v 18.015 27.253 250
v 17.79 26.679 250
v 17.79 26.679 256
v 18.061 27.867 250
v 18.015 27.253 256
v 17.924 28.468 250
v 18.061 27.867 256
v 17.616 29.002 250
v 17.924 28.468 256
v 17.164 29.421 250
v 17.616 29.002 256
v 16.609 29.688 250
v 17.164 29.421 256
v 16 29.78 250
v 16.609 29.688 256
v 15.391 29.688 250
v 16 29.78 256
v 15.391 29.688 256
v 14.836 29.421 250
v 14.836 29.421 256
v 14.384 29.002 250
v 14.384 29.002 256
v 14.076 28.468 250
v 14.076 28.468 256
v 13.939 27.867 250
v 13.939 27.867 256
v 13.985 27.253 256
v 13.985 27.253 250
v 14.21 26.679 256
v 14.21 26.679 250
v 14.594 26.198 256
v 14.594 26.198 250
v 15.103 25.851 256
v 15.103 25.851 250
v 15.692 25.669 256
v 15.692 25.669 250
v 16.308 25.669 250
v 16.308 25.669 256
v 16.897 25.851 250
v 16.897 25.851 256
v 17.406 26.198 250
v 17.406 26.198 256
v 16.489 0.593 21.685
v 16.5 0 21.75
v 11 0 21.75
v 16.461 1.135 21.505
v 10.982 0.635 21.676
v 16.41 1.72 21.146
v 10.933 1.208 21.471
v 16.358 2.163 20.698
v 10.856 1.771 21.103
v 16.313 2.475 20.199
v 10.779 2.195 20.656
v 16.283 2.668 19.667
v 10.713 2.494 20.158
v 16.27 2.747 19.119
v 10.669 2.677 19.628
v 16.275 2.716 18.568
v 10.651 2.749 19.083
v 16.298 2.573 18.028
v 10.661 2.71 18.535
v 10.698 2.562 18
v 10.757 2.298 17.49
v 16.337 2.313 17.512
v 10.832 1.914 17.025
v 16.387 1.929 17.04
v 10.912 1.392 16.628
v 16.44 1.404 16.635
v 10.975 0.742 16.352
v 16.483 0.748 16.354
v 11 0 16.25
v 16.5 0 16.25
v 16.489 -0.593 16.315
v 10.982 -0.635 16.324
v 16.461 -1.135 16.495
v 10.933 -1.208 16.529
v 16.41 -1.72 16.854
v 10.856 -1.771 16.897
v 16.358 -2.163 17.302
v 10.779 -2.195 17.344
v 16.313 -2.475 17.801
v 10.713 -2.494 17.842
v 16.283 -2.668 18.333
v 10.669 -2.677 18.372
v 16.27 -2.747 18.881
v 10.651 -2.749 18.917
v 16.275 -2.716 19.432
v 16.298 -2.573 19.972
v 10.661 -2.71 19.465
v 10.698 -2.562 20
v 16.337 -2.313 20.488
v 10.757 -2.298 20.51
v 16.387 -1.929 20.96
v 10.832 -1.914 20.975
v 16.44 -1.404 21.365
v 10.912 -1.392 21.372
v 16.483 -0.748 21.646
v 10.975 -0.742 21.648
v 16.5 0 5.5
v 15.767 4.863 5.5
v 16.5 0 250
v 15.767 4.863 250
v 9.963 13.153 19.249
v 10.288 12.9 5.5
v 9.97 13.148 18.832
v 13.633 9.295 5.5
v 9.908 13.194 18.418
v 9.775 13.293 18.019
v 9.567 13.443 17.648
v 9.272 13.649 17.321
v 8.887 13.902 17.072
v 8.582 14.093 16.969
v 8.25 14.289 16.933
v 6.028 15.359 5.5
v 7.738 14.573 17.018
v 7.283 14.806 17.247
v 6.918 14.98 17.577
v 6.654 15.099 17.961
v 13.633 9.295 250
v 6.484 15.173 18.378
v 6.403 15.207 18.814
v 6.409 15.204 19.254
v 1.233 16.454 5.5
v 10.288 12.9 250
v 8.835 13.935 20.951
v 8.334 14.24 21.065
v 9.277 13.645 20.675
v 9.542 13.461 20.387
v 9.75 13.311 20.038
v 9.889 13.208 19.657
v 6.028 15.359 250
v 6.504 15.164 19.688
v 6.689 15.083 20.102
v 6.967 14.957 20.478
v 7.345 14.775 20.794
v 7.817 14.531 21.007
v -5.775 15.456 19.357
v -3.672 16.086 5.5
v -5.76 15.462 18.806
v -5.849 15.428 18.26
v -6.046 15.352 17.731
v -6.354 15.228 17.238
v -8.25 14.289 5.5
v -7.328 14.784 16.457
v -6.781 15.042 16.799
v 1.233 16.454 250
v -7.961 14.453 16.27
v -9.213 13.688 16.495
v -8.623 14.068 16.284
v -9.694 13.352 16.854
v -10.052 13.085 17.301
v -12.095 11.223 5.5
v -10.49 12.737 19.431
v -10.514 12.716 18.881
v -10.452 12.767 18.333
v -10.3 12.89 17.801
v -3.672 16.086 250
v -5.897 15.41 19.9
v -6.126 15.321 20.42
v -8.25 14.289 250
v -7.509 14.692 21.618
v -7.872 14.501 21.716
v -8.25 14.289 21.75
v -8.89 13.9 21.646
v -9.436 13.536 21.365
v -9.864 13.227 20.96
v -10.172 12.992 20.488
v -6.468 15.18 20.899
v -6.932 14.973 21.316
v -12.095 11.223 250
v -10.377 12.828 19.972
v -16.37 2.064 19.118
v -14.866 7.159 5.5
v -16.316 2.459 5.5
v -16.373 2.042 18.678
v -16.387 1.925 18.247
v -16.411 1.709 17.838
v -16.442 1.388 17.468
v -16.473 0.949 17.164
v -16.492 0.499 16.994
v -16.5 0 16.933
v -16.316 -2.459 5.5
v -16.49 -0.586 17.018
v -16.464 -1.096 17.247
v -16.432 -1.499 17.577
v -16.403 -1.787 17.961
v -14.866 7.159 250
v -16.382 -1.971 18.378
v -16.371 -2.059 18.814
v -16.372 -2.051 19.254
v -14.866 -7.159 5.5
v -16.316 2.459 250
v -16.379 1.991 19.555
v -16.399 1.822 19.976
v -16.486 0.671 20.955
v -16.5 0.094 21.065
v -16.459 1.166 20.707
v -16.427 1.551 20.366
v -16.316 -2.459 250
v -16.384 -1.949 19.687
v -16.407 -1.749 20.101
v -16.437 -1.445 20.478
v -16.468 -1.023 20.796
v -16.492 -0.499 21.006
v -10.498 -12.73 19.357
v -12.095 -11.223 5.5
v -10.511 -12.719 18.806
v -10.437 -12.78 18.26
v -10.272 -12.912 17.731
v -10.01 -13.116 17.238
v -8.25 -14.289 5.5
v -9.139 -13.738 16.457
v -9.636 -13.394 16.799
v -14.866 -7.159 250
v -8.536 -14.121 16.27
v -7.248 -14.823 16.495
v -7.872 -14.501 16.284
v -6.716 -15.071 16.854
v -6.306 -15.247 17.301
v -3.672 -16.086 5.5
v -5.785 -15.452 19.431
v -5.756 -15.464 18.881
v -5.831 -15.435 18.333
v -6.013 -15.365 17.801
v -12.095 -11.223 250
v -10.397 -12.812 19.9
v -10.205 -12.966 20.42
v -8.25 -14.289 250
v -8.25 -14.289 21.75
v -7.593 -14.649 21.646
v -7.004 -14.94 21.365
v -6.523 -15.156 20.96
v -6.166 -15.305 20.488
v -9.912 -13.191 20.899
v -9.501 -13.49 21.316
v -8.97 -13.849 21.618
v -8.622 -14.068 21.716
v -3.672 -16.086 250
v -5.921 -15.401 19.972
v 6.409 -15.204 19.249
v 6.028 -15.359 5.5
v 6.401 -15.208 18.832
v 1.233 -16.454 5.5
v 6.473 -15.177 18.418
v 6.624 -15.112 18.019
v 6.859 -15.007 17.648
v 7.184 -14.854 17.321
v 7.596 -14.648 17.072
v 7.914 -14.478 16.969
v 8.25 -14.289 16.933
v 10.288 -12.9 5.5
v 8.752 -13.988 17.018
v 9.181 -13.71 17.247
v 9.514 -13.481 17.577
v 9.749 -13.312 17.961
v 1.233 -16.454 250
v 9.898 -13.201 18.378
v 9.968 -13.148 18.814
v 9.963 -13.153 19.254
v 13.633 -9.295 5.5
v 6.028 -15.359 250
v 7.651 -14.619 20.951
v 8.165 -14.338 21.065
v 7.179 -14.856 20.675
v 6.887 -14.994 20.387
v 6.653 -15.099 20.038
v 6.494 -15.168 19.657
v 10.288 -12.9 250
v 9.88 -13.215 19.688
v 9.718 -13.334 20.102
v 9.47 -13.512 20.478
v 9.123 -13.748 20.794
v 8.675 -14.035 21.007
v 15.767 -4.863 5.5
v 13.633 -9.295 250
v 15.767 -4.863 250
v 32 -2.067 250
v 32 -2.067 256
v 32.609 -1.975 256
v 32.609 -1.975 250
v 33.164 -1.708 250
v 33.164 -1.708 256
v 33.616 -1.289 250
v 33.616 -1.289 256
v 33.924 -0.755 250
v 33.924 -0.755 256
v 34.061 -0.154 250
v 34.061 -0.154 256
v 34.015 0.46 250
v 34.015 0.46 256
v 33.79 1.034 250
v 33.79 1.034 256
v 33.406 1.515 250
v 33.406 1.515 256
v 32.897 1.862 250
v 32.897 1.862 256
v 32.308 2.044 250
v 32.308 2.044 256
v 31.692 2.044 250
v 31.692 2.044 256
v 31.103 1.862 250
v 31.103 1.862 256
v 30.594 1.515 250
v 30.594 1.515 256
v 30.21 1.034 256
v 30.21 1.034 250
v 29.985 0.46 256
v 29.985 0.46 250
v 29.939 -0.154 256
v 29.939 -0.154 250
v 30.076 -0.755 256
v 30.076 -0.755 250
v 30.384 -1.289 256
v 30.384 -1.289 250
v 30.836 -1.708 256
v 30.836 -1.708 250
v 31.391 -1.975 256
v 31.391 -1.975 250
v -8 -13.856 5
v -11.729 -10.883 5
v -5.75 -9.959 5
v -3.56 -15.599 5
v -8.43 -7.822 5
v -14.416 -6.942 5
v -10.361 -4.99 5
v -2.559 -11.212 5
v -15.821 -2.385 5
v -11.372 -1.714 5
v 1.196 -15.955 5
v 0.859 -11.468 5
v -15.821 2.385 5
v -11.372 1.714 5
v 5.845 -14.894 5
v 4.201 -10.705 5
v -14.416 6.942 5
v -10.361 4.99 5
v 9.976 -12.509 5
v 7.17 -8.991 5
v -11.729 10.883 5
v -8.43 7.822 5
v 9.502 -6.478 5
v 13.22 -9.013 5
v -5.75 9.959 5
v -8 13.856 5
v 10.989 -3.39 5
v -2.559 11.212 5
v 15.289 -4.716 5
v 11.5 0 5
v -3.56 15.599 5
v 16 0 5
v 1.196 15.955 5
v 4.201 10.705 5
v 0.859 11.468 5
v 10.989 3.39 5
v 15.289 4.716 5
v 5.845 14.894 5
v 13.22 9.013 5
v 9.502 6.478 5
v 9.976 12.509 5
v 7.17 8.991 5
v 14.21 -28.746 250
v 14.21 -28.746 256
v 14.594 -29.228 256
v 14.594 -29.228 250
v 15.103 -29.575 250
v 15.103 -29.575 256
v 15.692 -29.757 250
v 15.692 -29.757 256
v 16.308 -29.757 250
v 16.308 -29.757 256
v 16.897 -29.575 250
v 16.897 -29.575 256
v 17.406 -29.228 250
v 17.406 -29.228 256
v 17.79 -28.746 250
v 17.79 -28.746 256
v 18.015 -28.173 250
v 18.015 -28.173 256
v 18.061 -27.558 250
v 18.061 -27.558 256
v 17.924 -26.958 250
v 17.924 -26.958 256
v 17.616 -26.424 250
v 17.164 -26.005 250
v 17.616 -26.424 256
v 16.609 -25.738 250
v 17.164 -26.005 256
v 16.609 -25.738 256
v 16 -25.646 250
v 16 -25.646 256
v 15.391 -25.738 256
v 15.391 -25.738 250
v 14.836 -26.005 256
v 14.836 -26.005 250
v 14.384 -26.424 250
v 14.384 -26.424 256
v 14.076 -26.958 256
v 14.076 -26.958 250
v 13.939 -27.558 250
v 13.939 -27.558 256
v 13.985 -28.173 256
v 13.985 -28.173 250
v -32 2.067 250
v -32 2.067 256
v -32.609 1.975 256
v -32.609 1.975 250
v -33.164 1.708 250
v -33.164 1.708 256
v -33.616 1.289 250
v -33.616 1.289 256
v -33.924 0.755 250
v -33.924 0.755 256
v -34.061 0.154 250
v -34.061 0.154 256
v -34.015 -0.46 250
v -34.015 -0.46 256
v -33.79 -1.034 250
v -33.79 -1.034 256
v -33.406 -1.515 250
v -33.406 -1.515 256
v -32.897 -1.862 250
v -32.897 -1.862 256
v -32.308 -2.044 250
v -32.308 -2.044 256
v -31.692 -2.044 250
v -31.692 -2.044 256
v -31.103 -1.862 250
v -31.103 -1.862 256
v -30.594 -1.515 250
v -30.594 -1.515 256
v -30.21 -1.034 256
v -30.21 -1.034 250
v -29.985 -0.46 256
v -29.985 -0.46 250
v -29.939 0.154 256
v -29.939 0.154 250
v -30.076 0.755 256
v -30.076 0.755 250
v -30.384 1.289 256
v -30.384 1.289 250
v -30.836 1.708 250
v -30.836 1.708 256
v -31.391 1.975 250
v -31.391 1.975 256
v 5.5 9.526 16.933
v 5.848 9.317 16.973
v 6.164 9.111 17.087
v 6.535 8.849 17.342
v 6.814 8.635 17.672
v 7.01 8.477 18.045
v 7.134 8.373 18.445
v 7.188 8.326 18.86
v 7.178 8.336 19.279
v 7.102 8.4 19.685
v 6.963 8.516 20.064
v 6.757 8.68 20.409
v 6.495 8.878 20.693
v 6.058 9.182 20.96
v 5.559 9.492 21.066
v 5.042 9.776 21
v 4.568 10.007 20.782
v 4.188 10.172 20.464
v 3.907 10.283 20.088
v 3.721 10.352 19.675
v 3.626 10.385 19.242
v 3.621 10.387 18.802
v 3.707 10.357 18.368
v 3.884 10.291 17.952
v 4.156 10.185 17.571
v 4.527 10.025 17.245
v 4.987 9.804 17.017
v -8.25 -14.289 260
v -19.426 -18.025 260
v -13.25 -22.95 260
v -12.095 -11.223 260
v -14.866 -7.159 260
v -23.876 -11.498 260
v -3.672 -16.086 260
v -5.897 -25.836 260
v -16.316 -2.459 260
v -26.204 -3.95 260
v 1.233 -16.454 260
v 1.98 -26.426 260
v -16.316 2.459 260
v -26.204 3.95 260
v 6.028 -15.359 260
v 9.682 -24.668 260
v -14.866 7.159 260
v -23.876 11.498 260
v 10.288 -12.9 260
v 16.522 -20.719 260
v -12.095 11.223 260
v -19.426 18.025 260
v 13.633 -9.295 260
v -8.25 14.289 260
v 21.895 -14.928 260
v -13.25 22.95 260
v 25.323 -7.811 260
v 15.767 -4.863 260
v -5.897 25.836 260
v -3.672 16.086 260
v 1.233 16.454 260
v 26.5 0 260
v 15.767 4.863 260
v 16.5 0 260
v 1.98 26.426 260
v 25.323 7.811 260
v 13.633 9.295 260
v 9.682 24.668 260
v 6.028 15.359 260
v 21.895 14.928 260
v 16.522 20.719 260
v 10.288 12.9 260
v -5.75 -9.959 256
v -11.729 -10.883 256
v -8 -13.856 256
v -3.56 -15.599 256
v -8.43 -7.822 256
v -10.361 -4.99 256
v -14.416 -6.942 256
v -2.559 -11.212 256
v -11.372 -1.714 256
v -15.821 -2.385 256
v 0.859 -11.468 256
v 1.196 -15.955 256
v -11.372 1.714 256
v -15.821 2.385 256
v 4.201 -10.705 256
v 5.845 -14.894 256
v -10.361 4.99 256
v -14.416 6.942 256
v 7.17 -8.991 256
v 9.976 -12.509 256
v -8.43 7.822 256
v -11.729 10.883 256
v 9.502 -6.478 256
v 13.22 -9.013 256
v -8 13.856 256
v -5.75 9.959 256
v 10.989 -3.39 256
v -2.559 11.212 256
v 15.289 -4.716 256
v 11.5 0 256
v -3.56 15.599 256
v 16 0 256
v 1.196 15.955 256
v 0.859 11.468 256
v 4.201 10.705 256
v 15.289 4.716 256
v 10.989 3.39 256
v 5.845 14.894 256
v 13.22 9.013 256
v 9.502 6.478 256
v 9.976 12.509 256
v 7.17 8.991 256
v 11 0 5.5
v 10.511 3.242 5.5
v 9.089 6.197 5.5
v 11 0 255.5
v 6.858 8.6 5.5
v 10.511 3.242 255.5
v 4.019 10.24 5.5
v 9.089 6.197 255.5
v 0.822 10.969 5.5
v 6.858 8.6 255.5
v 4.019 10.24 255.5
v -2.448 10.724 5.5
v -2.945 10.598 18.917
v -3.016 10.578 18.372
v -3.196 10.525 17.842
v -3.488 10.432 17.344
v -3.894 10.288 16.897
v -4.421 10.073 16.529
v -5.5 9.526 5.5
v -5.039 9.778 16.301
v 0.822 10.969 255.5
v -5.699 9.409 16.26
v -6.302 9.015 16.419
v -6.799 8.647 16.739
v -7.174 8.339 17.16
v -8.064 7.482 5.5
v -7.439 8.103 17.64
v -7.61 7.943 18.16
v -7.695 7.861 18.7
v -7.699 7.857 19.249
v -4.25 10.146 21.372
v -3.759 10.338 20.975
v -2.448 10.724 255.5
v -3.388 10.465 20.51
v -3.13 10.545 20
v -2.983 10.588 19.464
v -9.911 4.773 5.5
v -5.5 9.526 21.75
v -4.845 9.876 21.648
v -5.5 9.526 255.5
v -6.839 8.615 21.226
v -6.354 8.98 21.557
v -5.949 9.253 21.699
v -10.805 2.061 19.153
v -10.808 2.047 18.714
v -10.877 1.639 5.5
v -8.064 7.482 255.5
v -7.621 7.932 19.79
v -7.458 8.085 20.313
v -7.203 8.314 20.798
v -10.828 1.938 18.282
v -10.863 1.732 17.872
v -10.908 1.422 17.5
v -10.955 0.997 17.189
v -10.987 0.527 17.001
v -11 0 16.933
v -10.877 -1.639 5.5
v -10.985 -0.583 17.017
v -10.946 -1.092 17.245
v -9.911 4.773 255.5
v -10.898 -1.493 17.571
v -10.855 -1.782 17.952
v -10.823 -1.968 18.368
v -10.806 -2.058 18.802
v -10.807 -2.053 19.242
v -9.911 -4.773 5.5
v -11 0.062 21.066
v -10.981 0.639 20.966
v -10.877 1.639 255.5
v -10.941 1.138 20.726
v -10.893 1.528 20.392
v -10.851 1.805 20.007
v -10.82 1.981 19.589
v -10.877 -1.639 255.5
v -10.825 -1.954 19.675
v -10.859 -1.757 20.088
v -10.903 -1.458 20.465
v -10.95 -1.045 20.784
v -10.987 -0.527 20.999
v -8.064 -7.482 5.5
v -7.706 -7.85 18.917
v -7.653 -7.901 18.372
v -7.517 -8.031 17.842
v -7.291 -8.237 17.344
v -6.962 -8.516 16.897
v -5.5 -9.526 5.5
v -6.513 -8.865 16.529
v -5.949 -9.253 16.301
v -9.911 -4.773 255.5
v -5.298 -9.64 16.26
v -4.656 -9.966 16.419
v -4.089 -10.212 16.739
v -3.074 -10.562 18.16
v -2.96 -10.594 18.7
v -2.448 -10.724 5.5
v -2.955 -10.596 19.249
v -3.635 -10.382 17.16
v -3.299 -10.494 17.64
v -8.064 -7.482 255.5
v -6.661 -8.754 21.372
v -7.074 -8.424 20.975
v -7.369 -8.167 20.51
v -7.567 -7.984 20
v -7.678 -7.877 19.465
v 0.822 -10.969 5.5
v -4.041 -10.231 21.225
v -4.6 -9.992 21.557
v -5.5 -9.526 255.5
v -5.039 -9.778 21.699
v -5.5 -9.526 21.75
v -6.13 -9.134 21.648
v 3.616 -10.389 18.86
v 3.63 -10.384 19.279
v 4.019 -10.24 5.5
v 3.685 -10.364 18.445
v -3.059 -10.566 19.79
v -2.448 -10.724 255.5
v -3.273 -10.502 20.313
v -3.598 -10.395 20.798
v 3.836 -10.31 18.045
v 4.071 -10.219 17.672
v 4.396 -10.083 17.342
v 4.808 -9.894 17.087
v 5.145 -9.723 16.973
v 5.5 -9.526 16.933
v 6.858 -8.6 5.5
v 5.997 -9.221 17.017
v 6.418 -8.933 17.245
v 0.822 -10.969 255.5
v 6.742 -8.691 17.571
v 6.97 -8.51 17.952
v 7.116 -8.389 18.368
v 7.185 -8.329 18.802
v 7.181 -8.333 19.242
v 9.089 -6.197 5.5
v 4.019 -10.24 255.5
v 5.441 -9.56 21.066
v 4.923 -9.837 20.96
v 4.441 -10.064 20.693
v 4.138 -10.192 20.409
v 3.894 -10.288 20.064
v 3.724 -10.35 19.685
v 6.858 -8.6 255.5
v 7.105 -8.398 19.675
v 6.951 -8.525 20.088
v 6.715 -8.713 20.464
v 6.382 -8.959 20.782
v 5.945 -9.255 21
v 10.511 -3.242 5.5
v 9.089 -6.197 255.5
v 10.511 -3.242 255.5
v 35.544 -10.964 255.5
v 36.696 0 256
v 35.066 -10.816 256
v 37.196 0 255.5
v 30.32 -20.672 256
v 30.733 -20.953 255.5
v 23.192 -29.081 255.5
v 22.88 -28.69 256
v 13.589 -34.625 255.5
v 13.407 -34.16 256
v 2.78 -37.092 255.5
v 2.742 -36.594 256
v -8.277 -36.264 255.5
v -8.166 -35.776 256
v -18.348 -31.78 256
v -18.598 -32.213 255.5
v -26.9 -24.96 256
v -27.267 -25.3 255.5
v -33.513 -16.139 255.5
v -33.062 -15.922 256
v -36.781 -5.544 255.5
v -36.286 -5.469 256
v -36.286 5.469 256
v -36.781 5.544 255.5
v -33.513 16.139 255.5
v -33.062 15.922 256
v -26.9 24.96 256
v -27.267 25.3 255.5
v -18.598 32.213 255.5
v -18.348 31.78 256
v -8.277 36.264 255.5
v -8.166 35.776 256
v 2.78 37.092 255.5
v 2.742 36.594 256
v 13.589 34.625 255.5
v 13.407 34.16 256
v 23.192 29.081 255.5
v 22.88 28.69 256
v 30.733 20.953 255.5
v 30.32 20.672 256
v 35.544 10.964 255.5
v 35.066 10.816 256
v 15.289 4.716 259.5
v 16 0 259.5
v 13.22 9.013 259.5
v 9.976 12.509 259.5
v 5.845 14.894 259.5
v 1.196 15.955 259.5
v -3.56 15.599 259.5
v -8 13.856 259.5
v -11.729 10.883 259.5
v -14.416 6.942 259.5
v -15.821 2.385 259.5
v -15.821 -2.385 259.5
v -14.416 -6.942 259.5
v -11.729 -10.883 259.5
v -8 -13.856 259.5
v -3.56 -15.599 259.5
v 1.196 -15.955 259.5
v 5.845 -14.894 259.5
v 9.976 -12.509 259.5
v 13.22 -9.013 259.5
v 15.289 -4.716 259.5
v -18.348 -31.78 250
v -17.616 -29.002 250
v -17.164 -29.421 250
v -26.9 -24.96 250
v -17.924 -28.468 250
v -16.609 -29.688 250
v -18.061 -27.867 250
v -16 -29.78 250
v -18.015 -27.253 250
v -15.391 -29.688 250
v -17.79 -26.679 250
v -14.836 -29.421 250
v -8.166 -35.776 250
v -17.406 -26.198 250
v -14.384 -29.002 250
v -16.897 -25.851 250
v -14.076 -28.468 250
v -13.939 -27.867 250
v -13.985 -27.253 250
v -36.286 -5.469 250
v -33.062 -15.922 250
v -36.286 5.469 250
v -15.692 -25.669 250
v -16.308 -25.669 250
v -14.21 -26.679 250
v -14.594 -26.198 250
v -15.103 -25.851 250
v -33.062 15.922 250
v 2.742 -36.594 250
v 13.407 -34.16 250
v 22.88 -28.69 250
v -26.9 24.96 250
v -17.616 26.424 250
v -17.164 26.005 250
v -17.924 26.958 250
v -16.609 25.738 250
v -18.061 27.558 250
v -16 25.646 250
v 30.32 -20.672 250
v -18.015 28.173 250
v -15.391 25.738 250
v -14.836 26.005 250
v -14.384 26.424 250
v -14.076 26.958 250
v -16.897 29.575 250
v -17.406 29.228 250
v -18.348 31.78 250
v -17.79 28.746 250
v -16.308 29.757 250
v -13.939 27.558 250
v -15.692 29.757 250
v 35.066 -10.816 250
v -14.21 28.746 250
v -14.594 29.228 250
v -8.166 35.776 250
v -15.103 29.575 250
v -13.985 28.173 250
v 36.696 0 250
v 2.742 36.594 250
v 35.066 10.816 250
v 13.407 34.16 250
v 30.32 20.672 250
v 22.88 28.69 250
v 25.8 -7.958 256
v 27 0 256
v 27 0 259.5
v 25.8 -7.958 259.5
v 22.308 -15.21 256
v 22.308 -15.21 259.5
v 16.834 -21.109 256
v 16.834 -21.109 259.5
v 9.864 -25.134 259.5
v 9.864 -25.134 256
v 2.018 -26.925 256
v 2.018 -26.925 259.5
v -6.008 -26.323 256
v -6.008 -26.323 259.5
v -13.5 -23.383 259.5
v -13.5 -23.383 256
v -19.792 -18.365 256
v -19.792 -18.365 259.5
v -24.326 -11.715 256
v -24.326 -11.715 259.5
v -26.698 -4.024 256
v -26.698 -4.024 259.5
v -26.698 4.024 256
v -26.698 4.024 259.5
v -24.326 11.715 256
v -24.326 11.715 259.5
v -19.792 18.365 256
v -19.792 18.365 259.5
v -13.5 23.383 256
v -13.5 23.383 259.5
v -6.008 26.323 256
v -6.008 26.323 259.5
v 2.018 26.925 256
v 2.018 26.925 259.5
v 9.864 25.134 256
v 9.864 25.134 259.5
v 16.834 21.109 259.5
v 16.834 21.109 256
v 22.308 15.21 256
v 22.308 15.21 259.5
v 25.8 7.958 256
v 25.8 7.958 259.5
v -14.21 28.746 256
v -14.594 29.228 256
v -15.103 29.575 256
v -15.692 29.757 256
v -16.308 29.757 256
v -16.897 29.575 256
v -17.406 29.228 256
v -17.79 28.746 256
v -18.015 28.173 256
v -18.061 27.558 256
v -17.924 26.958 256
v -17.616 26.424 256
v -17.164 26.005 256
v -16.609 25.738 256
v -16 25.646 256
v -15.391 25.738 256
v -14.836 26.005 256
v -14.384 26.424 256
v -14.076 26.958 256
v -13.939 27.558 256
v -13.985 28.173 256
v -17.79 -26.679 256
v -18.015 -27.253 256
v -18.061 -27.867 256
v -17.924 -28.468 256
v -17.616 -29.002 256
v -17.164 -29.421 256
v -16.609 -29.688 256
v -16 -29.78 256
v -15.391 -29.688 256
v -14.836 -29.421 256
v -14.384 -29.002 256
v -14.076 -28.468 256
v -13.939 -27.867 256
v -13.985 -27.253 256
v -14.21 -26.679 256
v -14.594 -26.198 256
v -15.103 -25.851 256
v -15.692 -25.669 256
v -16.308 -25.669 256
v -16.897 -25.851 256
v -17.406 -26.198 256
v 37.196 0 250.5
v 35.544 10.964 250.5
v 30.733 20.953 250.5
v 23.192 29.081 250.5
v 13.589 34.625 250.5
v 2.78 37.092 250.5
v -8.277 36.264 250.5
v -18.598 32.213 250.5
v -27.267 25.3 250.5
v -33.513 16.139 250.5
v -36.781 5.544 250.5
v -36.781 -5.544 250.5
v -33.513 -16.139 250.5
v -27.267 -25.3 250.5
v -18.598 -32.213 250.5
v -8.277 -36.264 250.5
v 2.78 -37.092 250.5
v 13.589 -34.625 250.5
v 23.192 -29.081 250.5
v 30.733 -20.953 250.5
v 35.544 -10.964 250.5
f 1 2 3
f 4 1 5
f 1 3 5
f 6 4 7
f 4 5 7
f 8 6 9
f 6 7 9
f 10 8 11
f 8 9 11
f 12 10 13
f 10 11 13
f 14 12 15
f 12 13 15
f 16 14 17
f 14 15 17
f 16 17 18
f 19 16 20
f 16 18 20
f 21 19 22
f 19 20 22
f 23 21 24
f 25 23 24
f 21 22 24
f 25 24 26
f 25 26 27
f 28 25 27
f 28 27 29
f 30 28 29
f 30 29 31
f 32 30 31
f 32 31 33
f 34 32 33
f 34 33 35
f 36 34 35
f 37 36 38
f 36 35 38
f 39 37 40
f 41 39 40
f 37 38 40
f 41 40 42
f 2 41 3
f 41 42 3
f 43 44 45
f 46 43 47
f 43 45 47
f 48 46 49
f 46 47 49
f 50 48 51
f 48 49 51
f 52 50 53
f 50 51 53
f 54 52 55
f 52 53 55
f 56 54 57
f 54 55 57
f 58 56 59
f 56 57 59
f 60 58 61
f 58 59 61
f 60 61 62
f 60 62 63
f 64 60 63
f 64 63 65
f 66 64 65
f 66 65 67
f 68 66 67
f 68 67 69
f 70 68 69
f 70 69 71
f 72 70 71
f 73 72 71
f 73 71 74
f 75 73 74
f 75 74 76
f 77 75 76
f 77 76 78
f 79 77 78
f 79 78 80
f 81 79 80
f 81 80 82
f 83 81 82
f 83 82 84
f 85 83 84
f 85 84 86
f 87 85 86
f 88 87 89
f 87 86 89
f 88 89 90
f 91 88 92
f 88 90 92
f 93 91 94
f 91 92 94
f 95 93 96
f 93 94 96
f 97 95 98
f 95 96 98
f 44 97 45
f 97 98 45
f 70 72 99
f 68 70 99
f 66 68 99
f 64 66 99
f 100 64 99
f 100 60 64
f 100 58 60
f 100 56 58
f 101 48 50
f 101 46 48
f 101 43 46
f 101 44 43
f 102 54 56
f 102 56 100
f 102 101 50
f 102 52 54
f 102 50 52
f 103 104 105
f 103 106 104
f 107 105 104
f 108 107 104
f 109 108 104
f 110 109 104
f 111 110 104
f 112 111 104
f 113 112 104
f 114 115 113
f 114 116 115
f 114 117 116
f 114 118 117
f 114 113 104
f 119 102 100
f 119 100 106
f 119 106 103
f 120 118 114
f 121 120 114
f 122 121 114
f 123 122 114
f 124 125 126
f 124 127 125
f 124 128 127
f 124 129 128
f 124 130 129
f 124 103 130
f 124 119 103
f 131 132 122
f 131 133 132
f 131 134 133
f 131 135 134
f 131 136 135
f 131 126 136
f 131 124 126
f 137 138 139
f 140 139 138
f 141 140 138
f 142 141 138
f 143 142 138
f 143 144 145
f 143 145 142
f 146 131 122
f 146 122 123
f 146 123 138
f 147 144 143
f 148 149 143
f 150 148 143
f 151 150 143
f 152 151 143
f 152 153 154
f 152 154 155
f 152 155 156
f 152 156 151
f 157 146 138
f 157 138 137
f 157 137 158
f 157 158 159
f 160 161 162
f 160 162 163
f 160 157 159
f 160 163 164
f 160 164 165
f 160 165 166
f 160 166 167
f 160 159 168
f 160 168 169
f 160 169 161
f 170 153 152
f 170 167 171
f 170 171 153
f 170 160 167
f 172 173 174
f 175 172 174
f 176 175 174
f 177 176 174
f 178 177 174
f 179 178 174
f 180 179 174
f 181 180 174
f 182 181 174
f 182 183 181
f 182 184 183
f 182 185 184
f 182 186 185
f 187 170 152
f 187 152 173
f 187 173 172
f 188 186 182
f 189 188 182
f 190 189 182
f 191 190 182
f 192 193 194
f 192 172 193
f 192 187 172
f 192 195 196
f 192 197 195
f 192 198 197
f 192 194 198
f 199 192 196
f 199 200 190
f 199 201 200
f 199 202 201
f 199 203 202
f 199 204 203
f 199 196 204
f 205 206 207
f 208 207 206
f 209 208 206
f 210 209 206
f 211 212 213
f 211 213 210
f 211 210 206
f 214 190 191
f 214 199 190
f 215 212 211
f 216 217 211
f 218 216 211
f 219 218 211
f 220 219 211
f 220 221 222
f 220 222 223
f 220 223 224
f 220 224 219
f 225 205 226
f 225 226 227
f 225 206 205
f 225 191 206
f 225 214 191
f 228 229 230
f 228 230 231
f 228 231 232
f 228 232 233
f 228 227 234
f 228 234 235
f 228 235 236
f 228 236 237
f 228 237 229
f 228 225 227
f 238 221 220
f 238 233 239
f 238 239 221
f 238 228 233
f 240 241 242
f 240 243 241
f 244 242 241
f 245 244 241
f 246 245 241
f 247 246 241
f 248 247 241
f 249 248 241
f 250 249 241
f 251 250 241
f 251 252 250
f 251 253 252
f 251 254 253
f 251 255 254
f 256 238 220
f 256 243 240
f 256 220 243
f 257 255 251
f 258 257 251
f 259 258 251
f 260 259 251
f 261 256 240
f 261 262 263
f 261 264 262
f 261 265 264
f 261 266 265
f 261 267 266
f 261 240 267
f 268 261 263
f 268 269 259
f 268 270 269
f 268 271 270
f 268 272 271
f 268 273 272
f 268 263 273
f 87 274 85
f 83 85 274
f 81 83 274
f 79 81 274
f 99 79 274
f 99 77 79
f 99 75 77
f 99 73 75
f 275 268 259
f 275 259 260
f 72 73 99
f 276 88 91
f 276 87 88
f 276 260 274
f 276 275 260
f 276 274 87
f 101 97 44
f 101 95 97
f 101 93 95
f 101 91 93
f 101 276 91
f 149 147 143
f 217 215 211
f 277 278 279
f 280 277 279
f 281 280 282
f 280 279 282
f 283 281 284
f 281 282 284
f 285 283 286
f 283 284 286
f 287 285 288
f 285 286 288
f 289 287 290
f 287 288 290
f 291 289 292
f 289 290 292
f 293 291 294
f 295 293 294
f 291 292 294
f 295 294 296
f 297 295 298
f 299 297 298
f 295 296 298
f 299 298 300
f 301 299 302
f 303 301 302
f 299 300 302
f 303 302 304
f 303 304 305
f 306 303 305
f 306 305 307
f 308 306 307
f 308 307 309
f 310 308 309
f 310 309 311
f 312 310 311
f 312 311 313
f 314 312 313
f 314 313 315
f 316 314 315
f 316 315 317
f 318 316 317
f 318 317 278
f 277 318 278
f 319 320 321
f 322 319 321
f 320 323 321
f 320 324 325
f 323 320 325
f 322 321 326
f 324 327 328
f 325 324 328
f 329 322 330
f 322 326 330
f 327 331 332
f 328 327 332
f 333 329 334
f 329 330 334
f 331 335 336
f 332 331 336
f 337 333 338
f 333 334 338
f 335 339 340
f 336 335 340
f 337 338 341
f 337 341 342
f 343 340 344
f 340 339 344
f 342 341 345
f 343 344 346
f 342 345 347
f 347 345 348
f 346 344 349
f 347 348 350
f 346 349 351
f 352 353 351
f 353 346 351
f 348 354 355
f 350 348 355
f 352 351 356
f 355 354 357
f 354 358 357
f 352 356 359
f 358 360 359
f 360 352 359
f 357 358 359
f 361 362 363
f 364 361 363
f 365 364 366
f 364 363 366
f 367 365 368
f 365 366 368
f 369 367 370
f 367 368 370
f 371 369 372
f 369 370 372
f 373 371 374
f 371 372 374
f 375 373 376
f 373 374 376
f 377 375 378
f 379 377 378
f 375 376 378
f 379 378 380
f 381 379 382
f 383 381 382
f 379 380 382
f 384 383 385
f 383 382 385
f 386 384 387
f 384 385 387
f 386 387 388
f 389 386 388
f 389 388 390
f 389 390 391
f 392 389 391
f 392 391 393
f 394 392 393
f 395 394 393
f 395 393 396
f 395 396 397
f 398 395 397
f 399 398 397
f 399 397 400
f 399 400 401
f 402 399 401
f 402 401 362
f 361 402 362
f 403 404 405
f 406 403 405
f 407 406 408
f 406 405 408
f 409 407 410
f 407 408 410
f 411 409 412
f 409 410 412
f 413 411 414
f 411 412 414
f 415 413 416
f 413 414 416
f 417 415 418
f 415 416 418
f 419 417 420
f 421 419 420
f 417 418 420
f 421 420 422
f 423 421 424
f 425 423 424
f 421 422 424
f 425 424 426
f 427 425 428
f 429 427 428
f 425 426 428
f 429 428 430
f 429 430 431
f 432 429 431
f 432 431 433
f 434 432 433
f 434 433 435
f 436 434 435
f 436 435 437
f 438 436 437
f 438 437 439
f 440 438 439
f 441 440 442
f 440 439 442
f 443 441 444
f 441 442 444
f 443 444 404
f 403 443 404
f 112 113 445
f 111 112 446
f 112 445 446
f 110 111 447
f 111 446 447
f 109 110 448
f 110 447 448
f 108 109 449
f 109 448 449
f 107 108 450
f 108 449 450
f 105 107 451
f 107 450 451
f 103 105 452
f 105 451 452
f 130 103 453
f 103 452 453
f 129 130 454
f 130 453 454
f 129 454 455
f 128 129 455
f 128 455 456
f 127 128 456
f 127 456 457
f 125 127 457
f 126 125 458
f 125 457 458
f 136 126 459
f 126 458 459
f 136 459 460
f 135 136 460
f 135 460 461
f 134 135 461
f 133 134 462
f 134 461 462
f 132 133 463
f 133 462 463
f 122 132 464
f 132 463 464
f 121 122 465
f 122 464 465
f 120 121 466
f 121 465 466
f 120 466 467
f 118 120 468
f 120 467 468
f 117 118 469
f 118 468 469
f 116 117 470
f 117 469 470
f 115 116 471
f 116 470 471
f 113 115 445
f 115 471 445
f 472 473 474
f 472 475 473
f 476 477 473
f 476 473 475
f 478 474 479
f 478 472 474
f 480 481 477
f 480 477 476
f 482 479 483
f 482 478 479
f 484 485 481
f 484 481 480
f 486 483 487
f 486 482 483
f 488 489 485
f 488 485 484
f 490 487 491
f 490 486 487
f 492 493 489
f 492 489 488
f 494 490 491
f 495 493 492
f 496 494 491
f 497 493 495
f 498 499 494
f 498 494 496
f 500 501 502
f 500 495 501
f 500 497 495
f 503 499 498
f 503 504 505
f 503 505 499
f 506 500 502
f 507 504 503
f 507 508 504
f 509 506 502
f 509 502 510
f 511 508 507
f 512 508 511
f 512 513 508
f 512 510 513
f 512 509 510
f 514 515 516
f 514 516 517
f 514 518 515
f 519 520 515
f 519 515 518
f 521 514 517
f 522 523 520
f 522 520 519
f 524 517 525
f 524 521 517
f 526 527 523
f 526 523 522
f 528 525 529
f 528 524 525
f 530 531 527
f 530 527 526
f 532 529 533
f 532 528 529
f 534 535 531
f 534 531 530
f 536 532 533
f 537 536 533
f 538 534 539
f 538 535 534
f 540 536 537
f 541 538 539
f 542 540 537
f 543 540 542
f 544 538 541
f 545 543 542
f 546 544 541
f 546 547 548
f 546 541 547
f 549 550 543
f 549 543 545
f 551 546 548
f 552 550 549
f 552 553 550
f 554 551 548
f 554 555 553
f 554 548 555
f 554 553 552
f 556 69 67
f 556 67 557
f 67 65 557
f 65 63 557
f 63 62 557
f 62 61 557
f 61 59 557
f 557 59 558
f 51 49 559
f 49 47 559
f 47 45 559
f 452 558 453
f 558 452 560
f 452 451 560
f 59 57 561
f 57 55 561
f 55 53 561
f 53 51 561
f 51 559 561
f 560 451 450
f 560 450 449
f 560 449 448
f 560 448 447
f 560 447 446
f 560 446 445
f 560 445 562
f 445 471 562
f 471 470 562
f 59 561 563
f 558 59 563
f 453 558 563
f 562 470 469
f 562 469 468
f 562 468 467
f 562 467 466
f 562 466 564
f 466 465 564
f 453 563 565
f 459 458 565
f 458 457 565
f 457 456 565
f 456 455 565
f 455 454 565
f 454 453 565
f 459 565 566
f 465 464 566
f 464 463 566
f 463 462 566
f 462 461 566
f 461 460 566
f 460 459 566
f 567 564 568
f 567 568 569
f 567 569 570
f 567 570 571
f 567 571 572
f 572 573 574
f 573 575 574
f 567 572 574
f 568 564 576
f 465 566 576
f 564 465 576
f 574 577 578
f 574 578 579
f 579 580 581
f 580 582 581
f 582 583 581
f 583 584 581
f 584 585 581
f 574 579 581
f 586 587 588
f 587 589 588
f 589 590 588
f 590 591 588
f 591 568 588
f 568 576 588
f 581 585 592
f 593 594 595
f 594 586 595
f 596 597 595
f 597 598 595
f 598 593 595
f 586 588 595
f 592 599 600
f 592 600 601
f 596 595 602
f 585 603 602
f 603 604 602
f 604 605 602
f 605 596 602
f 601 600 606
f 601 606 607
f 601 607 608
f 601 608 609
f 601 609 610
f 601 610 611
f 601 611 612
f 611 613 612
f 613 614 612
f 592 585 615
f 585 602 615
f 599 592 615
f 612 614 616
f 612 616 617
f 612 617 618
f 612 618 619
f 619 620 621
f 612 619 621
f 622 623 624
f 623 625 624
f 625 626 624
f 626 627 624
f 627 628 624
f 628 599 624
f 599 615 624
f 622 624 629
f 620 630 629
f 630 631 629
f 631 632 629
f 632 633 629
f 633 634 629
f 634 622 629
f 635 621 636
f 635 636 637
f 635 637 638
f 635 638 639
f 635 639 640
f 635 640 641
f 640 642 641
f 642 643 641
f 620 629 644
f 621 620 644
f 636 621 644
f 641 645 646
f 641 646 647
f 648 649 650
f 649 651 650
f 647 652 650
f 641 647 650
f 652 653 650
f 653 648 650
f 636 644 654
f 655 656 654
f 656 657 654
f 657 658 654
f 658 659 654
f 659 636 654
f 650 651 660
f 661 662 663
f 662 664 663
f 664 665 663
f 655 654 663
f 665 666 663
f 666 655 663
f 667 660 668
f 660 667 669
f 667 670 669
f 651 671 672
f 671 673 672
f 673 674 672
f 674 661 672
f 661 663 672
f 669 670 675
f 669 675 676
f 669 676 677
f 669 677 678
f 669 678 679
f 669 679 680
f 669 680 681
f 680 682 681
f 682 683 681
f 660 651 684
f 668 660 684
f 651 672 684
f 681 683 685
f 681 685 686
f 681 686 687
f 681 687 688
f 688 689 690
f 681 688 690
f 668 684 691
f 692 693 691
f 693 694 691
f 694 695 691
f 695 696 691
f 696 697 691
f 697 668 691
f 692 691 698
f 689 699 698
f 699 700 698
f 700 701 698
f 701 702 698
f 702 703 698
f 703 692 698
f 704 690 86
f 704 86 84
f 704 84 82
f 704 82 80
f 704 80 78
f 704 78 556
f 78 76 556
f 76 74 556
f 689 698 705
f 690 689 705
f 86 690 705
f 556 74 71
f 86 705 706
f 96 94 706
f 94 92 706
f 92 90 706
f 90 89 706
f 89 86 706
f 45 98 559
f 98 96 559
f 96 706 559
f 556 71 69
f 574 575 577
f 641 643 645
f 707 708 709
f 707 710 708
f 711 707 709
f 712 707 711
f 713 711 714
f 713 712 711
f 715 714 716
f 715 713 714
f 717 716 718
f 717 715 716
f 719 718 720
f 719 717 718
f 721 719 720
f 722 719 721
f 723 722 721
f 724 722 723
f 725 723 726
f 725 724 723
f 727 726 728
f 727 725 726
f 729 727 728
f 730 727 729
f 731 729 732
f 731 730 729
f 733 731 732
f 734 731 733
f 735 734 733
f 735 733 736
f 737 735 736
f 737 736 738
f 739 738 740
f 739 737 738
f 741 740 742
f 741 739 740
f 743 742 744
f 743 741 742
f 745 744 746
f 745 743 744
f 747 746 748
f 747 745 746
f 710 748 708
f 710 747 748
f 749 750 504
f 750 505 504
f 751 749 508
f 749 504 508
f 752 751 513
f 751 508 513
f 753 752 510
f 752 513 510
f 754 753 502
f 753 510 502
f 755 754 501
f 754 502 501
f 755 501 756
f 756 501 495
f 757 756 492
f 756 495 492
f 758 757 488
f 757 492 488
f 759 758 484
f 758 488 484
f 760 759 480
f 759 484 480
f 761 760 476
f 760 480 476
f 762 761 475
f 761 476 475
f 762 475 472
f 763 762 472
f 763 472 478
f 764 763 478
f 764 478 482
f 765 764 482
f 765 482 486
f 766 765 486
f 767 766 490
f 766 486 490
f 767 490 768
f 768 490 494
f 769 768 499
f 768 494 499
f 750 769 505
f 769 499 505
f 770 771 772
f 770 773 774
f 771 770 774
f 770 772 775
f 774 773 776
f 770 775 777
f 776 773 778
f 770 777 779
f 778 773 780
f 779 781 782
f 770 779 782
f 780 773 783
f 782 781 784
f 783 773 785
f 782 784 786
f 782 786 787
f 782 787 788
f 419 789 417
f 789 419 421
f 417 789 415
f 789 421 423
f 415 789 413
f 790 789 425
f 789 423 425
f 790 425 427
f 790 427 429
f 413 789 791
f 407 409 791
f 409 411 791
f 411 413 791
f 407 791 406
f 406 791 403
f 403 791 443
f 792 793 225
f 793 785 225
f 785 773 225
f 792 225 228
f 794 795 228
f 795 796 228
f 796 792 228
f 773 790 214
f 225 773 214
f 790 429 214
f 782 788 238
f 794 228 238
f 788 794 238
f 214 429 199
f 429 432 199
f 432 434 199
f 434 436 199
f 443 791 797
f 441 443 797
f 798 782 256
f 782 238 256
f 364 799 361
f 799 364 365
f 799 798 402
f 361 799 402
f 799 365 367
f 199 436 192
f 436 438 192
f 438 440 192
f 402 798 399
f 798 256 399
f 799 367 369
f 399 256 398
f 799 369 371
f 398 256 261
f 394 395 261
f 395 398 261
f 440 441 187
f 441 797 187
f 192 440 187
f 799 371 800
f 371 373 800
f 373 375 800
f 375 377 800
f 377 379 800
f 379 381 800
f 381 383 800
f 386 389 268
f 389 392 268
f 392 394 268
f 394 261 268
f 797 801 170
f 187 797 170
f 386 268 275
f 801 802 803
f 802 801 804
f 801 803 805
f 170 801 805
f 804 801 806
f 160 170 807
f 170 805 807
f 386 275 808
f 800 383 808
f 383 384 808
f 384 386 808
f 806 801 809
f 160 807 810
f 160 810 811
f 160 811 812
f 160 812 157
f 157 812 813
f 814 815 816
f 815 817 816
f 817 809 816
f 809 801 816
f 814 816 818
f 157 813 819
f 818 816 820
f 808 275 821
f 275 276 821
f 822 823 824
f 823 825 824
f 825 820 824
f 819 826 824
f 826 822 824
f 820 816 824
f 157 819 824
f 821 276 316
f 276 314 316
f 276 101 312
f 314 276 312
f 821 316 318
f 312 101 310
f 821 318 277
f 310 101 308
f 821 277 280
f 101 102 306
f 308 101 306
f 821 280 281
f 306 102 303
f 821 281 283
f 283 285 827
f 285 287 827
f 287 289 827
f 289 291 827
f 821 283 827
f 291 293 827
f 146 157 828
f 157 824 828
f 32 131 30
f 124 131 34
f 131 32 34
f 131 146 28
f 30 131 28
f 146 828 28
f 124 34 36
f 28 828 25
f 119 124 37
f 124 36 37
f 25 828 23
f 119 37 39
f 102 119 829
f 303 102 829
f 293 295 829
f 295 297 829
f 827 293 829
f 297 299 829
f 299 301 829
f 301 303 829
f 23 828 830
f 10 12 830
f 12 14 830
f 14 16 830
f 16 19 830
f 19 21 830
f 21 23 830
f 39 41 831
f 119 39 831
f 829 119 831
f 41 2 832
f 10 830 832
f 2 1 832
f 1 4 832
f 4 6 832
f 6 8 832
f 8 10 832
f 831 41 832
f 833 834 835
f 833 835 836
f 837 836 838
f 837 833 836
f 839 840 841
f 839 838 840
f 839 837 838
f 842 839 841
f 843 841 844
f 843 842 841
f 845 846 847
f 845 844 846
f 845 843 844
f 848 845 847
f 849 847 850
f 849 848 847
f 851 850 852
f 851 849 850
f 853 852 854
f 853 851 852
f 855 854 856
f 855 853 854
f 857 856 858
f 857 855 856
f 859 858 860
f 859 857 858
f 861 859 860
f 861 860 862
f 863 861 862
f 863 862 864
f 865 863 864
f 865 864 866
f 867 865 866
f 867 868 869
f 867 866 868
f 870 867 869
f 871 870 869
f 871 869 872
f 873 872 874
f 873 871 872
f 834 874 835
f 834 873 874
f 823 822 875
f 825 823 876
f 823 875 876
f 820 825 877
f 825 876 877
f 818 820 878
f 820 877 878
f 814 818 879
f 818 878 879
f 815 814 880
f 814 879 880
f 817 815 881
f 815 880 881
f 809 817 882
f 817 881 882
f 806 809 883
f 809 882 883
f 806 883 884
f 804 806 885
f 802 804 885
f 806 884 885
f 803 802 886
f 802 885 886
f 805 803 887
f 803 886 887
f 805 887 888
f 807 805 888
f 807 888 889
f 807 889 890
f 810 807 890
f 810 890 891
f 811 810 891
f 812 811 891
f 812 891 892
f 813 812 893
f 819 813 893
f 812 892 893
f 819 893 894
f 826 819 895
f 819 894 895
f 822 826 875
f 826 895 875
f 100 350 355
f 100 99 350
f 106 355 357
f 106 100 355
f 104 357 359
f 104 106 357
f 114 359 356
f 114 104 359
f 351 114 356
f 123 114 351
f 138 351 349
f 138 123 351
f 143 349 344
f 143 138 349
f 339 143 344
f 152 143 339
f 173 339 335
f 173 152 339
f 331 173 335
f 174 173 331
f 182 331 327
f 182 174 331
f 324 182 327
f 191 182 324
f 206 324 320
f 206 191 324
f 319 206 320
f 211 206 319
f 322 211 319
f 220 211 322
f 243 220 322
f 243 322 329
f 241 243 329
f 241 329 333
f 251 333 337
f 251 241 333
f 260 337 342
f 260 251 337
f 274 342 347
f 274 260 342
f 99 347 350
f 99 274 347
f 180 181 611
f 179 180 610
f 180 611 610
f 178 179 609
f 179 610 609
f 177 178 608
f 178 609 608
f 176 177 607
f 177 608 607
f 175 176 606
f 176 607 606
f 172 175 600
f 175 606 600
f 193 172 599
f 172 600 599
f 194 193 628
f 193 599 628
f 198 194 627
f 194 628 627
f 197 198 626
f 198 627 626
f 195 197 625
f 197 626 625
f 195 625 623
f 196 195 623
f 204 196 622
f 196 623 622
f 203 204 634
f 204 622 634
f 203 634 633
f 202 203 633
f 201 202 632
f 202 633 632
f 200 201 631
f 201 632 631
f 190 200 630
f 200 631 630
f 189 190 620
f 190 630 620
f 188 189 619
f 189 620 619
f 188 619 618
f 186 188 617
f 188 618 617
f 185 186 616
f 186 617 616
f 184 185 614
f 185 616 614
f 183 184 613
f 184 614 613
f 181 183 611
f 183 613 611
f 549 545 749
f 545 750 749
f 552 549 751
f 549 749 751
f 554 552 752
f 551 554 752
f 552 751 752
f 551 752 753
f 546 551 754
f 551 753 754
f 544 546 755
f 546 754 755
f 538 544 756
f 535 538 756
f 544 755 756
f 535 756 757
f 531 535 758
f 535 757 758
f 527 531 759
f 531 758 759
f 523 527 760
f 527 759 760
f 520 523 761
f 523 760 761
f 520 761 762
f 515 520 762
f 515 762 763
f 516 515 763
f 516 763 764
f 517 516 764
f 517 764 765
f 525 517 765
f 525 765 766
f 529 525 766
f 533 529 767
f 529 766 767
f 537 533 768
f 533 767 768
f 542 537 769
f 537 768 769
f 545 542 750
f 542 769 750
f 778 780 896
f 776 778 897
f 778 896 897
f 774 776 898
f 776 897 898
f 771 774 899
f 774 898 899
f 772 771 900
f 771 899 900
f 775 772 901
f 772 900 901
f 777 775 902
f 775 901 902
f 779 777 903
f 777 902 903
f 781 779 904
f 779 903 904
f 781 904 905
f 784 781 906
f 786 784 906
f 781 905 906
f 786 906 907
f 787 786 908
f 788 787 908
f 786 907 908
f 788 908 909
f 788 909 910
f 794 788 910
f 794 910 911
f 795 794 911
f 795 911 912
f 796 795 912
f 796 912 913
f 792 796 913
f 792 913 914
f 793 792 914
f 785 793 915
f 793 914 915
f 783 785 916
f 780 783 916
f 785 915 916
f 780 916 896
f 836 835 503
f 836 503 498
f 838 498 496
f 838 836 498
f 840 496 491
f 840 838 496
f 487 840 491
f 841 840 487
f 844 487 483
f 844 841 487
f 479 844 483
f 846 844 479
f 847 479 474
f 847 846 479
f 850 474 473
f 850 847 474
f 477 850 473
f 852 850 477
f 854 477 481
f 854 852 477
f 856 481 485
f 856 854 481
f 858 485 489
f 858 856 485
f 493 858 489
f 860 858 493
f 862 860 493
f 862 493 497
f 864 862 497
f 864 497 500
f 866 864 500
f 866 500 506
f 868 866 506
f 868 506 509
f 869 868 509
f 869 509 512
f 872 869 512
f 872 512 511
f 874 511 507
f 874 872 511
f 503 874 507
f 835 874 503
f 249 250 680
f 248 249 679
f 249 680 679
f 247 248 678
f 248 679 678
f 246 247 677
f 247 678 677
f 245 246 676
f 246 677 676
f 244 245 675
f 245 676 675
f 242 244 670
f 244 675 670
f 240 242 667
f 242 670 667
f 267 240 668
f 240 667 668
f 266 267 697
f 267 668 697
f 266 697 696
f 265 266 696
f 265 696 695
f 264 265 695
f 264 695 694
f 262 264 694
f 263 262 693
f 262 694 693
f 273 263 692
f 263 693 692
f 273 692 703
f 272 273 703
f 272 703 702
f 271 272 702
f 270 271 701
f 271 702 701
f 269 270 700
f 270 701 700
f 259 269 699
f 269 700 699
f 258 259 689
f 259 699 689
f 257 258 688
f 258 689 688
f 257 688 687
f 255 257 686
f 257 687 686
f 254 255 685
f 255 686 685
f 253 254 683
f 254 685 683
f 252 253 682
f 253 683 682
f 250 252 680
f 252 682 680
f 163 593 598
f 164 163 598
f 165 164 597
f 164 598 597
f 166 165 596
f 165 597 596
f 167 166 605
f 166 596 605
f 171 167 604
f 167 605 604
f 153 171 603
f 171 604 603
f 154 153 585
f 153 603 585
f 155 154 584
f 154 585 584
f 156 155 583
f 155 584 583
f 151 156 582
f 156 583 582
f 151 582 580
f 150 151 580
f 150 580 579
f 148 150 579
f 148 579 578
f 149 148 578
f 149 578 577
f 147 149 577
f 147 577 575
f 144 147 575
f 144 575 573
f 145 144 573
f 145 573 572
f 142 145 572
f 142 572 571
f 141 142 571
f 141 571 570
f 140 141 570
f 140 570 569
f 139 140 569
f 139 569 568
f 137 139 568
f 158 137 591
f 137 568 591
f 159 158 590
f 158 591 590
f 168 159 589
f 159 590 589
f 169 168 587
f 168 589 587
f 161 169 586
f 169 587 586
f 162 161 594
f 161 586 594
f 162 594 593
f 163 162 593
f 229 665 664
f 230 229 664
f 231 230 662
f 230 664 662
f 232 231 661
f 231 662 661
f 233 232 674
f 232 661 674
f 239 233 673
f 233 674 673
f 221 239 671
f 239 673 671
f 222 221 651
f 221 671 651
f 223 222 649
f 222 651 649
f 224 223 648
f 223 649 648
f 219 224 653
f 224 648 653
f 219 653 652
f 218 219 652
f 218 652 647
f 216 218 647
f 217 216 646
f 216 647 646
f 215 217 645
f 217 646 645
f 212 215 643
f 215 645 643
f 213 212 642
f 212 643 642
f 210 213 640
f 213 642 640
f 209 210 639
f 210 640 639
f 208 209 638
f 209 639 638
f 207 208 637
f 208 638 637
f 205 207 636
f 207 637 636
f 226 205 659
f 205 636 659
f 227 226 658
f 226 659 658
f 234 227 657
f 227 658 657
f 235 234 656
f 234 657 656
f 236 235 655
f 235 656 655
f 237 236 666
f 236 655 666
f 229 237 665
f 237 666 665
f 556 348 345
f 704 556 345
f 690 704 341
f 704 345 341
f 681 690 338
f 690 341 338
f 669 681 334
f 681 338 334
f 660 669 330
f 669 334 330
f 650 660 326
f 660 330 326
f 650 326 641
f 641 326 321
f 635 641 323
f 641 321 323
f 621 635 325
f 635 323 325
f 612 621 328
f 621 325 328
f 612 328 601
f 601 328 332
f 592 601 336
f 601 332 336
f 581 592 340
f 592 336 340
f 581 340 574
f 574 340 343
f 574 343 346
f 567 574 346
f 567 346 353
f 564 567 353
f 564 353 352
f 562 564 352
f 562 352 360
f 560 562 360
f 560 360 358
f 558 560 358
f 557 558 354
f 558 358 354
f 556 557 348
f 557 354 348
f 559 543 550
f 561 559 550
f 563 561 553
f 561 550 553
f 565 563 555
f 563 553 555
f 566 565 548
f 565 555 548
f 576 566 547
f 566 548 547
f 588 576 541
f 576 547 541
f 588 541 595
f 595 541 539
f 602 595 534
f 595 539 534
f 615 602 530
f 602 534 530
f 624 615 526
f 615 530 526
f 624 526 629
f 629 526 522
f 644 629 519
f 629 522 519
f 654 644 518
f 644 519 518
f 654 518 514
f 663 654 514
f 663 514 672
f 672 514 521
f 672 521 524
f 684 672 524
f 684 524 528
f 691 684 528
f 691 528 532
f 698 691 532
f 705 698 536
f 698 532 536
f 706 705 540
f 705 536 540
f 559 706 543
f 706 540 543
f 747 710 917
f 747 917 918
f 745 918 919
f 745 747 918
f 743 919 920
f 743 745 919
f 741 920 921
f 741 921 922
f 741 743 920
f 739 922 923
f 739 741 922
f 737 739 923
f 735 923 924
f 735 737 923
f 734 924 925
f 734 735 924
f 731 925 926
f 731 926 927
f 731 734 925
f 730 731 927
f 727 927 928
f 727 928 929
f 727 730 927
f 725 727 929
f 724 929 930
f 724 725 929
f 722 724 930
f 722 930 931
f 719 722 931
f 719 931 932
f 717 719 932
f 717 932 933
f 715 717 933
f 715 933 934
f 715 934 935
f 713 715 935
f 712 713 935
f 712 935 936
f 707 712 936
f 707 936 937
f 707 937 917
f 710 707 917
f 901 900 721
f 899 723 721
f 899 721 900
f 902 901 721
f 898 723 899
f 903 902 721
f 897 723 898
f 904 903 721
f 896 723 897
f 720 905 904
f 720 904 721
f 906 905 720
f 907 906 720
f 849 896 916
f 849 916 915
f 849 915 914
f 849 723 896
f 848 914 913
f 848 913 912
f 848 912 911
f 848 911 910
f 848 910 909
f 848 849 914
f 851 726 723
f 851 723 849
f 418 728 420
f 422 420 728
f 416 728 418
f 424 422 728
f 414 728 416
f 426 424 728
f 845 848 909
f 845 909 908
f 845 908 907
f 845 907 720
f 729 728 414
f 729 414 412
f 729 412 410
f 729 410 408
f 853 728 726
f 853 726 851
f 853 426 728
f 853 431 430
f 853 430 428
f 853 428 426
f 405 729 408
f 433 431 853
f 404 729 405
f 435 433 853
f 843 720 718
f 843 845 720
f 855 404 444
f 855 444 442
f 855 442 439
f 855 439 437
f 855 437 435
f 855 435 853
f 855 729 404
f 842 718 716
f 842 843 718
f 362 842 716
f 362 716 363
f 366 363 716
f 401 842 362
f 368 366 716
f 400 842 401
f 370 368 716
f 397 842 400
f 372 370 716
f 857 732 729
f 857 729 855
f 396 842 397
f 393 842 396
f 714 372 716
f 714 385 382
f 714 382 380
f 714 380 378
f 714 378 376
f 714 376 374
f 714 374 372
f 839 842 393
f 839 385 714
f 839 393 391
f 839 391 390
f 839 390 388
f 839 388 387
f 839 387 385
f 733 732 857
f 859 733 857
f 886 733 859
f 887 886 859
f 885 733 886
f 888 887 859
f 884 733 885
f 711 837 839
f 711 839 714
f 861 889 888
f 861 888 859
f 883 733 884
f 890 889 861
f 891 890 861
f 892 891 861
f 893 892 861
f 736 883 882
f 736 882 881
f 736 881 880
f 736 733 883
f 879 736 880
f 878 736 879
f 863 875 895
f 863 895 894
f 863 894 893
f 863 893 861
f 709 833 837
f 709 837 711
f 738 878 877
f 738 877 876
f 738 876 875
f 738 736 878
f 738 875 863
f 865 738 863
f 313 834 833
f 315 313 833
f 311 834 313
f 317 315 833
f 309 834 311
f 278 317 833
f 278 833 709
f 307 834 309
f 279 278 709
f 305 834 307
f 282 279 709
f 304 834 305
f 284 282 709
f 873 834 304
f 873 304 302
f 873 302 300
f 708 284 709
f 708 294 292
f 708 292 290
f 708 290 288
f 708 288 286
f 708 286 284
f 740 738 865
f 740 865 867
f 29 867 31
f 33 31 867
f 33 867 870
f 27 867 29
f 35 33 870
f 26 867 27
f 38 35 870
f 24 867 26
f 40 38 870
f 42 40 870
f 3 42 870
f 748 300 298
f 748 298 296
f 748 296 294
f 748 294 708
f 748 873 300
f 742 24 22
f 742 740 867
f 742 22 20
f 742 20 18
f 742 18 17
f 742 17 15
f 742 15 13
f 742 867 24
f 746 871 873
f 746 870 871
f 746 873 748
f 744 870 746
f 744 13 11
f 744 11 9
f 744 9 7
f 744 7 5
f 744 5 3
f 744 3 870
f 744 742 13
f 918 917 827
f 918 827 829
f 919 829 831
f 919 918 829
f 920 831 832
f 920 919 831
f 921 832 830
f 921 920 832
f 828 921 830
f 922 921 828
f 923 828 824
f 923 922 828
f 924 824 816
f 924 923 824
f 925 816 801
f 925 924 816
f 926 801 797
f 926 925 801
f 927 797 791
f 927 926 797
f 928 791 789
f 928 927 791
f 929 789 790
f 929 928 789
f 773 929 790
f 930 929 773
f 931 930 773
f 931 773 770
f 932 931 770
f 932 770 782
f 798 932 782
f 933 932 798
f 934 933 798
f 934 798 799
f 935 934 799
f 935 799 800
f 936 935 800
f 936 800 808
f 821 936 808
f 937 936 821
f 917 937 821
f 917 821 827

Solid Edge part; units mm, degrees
sketch "Sketch1" plane through (0, 0, 0) normal (0, -1, 0) x (1, 0, 0)
  line L0 (11, 5) -> (16.5, 5)
  line L1 (16.5, 5) -> (16.5, 250)
  line L2 (16.5, 250) -> (37.1963, 250)
  line L3 (37.1963, 250) -> (37.1963, 256)
  line L4 (27, 256) -> (37.1963, 256)
  line L5 (27, 260) -> (27, 256)
  line L6 (16, 260) -> (27, 260)
  line L7 (16, 256) -> (16, 260)
  line L8 (11, 256) -> (16, 256)
  line L9 (11, 5) -> (11, 256)
  dimension "D1" = 5
  dimension "D2" = 245
  dimension "D3" = 6
  dimension "D4" = 4
  dimension "D5" = 4
revolve "RevolvedProtrusion1" add sketch "Sketch1" angle 360 about axis through (0, 0, 0) along (0, 0, 1)
hole "Hole1" at (0, 0, 19) direction (-1, 0, 0) diameter 4.134 end through all
hole "Hole_2" at (0, 0, 19) direction (1, 0, 0) diameter 5.5 end up to next
hole "Hole_3" at (32, 0, 256) direction (0, 0, -1) diameter 4.134 end through all
pattern_circular "Pattern1" count 6 over 360 about axis through (0, 0, 260) along (0, 0, -1) of "Hole_3"
chamfer "Chamfer_1" distance 0.5 angle 45 7 edges at (-11, 0, 5) (-16.5, 0, 5) (-37.1963, 0, 250) (-37.1963, 0, 256) (-27, 0, 260) (-16, 0, 260) (-11, 0, 256)
pattern_circular "Pattern3" count 3 over 360 about axis through (0, 0, 5) along (0, 0, 1) of "Hole_2", "Hole1"
properties material "Steel"
